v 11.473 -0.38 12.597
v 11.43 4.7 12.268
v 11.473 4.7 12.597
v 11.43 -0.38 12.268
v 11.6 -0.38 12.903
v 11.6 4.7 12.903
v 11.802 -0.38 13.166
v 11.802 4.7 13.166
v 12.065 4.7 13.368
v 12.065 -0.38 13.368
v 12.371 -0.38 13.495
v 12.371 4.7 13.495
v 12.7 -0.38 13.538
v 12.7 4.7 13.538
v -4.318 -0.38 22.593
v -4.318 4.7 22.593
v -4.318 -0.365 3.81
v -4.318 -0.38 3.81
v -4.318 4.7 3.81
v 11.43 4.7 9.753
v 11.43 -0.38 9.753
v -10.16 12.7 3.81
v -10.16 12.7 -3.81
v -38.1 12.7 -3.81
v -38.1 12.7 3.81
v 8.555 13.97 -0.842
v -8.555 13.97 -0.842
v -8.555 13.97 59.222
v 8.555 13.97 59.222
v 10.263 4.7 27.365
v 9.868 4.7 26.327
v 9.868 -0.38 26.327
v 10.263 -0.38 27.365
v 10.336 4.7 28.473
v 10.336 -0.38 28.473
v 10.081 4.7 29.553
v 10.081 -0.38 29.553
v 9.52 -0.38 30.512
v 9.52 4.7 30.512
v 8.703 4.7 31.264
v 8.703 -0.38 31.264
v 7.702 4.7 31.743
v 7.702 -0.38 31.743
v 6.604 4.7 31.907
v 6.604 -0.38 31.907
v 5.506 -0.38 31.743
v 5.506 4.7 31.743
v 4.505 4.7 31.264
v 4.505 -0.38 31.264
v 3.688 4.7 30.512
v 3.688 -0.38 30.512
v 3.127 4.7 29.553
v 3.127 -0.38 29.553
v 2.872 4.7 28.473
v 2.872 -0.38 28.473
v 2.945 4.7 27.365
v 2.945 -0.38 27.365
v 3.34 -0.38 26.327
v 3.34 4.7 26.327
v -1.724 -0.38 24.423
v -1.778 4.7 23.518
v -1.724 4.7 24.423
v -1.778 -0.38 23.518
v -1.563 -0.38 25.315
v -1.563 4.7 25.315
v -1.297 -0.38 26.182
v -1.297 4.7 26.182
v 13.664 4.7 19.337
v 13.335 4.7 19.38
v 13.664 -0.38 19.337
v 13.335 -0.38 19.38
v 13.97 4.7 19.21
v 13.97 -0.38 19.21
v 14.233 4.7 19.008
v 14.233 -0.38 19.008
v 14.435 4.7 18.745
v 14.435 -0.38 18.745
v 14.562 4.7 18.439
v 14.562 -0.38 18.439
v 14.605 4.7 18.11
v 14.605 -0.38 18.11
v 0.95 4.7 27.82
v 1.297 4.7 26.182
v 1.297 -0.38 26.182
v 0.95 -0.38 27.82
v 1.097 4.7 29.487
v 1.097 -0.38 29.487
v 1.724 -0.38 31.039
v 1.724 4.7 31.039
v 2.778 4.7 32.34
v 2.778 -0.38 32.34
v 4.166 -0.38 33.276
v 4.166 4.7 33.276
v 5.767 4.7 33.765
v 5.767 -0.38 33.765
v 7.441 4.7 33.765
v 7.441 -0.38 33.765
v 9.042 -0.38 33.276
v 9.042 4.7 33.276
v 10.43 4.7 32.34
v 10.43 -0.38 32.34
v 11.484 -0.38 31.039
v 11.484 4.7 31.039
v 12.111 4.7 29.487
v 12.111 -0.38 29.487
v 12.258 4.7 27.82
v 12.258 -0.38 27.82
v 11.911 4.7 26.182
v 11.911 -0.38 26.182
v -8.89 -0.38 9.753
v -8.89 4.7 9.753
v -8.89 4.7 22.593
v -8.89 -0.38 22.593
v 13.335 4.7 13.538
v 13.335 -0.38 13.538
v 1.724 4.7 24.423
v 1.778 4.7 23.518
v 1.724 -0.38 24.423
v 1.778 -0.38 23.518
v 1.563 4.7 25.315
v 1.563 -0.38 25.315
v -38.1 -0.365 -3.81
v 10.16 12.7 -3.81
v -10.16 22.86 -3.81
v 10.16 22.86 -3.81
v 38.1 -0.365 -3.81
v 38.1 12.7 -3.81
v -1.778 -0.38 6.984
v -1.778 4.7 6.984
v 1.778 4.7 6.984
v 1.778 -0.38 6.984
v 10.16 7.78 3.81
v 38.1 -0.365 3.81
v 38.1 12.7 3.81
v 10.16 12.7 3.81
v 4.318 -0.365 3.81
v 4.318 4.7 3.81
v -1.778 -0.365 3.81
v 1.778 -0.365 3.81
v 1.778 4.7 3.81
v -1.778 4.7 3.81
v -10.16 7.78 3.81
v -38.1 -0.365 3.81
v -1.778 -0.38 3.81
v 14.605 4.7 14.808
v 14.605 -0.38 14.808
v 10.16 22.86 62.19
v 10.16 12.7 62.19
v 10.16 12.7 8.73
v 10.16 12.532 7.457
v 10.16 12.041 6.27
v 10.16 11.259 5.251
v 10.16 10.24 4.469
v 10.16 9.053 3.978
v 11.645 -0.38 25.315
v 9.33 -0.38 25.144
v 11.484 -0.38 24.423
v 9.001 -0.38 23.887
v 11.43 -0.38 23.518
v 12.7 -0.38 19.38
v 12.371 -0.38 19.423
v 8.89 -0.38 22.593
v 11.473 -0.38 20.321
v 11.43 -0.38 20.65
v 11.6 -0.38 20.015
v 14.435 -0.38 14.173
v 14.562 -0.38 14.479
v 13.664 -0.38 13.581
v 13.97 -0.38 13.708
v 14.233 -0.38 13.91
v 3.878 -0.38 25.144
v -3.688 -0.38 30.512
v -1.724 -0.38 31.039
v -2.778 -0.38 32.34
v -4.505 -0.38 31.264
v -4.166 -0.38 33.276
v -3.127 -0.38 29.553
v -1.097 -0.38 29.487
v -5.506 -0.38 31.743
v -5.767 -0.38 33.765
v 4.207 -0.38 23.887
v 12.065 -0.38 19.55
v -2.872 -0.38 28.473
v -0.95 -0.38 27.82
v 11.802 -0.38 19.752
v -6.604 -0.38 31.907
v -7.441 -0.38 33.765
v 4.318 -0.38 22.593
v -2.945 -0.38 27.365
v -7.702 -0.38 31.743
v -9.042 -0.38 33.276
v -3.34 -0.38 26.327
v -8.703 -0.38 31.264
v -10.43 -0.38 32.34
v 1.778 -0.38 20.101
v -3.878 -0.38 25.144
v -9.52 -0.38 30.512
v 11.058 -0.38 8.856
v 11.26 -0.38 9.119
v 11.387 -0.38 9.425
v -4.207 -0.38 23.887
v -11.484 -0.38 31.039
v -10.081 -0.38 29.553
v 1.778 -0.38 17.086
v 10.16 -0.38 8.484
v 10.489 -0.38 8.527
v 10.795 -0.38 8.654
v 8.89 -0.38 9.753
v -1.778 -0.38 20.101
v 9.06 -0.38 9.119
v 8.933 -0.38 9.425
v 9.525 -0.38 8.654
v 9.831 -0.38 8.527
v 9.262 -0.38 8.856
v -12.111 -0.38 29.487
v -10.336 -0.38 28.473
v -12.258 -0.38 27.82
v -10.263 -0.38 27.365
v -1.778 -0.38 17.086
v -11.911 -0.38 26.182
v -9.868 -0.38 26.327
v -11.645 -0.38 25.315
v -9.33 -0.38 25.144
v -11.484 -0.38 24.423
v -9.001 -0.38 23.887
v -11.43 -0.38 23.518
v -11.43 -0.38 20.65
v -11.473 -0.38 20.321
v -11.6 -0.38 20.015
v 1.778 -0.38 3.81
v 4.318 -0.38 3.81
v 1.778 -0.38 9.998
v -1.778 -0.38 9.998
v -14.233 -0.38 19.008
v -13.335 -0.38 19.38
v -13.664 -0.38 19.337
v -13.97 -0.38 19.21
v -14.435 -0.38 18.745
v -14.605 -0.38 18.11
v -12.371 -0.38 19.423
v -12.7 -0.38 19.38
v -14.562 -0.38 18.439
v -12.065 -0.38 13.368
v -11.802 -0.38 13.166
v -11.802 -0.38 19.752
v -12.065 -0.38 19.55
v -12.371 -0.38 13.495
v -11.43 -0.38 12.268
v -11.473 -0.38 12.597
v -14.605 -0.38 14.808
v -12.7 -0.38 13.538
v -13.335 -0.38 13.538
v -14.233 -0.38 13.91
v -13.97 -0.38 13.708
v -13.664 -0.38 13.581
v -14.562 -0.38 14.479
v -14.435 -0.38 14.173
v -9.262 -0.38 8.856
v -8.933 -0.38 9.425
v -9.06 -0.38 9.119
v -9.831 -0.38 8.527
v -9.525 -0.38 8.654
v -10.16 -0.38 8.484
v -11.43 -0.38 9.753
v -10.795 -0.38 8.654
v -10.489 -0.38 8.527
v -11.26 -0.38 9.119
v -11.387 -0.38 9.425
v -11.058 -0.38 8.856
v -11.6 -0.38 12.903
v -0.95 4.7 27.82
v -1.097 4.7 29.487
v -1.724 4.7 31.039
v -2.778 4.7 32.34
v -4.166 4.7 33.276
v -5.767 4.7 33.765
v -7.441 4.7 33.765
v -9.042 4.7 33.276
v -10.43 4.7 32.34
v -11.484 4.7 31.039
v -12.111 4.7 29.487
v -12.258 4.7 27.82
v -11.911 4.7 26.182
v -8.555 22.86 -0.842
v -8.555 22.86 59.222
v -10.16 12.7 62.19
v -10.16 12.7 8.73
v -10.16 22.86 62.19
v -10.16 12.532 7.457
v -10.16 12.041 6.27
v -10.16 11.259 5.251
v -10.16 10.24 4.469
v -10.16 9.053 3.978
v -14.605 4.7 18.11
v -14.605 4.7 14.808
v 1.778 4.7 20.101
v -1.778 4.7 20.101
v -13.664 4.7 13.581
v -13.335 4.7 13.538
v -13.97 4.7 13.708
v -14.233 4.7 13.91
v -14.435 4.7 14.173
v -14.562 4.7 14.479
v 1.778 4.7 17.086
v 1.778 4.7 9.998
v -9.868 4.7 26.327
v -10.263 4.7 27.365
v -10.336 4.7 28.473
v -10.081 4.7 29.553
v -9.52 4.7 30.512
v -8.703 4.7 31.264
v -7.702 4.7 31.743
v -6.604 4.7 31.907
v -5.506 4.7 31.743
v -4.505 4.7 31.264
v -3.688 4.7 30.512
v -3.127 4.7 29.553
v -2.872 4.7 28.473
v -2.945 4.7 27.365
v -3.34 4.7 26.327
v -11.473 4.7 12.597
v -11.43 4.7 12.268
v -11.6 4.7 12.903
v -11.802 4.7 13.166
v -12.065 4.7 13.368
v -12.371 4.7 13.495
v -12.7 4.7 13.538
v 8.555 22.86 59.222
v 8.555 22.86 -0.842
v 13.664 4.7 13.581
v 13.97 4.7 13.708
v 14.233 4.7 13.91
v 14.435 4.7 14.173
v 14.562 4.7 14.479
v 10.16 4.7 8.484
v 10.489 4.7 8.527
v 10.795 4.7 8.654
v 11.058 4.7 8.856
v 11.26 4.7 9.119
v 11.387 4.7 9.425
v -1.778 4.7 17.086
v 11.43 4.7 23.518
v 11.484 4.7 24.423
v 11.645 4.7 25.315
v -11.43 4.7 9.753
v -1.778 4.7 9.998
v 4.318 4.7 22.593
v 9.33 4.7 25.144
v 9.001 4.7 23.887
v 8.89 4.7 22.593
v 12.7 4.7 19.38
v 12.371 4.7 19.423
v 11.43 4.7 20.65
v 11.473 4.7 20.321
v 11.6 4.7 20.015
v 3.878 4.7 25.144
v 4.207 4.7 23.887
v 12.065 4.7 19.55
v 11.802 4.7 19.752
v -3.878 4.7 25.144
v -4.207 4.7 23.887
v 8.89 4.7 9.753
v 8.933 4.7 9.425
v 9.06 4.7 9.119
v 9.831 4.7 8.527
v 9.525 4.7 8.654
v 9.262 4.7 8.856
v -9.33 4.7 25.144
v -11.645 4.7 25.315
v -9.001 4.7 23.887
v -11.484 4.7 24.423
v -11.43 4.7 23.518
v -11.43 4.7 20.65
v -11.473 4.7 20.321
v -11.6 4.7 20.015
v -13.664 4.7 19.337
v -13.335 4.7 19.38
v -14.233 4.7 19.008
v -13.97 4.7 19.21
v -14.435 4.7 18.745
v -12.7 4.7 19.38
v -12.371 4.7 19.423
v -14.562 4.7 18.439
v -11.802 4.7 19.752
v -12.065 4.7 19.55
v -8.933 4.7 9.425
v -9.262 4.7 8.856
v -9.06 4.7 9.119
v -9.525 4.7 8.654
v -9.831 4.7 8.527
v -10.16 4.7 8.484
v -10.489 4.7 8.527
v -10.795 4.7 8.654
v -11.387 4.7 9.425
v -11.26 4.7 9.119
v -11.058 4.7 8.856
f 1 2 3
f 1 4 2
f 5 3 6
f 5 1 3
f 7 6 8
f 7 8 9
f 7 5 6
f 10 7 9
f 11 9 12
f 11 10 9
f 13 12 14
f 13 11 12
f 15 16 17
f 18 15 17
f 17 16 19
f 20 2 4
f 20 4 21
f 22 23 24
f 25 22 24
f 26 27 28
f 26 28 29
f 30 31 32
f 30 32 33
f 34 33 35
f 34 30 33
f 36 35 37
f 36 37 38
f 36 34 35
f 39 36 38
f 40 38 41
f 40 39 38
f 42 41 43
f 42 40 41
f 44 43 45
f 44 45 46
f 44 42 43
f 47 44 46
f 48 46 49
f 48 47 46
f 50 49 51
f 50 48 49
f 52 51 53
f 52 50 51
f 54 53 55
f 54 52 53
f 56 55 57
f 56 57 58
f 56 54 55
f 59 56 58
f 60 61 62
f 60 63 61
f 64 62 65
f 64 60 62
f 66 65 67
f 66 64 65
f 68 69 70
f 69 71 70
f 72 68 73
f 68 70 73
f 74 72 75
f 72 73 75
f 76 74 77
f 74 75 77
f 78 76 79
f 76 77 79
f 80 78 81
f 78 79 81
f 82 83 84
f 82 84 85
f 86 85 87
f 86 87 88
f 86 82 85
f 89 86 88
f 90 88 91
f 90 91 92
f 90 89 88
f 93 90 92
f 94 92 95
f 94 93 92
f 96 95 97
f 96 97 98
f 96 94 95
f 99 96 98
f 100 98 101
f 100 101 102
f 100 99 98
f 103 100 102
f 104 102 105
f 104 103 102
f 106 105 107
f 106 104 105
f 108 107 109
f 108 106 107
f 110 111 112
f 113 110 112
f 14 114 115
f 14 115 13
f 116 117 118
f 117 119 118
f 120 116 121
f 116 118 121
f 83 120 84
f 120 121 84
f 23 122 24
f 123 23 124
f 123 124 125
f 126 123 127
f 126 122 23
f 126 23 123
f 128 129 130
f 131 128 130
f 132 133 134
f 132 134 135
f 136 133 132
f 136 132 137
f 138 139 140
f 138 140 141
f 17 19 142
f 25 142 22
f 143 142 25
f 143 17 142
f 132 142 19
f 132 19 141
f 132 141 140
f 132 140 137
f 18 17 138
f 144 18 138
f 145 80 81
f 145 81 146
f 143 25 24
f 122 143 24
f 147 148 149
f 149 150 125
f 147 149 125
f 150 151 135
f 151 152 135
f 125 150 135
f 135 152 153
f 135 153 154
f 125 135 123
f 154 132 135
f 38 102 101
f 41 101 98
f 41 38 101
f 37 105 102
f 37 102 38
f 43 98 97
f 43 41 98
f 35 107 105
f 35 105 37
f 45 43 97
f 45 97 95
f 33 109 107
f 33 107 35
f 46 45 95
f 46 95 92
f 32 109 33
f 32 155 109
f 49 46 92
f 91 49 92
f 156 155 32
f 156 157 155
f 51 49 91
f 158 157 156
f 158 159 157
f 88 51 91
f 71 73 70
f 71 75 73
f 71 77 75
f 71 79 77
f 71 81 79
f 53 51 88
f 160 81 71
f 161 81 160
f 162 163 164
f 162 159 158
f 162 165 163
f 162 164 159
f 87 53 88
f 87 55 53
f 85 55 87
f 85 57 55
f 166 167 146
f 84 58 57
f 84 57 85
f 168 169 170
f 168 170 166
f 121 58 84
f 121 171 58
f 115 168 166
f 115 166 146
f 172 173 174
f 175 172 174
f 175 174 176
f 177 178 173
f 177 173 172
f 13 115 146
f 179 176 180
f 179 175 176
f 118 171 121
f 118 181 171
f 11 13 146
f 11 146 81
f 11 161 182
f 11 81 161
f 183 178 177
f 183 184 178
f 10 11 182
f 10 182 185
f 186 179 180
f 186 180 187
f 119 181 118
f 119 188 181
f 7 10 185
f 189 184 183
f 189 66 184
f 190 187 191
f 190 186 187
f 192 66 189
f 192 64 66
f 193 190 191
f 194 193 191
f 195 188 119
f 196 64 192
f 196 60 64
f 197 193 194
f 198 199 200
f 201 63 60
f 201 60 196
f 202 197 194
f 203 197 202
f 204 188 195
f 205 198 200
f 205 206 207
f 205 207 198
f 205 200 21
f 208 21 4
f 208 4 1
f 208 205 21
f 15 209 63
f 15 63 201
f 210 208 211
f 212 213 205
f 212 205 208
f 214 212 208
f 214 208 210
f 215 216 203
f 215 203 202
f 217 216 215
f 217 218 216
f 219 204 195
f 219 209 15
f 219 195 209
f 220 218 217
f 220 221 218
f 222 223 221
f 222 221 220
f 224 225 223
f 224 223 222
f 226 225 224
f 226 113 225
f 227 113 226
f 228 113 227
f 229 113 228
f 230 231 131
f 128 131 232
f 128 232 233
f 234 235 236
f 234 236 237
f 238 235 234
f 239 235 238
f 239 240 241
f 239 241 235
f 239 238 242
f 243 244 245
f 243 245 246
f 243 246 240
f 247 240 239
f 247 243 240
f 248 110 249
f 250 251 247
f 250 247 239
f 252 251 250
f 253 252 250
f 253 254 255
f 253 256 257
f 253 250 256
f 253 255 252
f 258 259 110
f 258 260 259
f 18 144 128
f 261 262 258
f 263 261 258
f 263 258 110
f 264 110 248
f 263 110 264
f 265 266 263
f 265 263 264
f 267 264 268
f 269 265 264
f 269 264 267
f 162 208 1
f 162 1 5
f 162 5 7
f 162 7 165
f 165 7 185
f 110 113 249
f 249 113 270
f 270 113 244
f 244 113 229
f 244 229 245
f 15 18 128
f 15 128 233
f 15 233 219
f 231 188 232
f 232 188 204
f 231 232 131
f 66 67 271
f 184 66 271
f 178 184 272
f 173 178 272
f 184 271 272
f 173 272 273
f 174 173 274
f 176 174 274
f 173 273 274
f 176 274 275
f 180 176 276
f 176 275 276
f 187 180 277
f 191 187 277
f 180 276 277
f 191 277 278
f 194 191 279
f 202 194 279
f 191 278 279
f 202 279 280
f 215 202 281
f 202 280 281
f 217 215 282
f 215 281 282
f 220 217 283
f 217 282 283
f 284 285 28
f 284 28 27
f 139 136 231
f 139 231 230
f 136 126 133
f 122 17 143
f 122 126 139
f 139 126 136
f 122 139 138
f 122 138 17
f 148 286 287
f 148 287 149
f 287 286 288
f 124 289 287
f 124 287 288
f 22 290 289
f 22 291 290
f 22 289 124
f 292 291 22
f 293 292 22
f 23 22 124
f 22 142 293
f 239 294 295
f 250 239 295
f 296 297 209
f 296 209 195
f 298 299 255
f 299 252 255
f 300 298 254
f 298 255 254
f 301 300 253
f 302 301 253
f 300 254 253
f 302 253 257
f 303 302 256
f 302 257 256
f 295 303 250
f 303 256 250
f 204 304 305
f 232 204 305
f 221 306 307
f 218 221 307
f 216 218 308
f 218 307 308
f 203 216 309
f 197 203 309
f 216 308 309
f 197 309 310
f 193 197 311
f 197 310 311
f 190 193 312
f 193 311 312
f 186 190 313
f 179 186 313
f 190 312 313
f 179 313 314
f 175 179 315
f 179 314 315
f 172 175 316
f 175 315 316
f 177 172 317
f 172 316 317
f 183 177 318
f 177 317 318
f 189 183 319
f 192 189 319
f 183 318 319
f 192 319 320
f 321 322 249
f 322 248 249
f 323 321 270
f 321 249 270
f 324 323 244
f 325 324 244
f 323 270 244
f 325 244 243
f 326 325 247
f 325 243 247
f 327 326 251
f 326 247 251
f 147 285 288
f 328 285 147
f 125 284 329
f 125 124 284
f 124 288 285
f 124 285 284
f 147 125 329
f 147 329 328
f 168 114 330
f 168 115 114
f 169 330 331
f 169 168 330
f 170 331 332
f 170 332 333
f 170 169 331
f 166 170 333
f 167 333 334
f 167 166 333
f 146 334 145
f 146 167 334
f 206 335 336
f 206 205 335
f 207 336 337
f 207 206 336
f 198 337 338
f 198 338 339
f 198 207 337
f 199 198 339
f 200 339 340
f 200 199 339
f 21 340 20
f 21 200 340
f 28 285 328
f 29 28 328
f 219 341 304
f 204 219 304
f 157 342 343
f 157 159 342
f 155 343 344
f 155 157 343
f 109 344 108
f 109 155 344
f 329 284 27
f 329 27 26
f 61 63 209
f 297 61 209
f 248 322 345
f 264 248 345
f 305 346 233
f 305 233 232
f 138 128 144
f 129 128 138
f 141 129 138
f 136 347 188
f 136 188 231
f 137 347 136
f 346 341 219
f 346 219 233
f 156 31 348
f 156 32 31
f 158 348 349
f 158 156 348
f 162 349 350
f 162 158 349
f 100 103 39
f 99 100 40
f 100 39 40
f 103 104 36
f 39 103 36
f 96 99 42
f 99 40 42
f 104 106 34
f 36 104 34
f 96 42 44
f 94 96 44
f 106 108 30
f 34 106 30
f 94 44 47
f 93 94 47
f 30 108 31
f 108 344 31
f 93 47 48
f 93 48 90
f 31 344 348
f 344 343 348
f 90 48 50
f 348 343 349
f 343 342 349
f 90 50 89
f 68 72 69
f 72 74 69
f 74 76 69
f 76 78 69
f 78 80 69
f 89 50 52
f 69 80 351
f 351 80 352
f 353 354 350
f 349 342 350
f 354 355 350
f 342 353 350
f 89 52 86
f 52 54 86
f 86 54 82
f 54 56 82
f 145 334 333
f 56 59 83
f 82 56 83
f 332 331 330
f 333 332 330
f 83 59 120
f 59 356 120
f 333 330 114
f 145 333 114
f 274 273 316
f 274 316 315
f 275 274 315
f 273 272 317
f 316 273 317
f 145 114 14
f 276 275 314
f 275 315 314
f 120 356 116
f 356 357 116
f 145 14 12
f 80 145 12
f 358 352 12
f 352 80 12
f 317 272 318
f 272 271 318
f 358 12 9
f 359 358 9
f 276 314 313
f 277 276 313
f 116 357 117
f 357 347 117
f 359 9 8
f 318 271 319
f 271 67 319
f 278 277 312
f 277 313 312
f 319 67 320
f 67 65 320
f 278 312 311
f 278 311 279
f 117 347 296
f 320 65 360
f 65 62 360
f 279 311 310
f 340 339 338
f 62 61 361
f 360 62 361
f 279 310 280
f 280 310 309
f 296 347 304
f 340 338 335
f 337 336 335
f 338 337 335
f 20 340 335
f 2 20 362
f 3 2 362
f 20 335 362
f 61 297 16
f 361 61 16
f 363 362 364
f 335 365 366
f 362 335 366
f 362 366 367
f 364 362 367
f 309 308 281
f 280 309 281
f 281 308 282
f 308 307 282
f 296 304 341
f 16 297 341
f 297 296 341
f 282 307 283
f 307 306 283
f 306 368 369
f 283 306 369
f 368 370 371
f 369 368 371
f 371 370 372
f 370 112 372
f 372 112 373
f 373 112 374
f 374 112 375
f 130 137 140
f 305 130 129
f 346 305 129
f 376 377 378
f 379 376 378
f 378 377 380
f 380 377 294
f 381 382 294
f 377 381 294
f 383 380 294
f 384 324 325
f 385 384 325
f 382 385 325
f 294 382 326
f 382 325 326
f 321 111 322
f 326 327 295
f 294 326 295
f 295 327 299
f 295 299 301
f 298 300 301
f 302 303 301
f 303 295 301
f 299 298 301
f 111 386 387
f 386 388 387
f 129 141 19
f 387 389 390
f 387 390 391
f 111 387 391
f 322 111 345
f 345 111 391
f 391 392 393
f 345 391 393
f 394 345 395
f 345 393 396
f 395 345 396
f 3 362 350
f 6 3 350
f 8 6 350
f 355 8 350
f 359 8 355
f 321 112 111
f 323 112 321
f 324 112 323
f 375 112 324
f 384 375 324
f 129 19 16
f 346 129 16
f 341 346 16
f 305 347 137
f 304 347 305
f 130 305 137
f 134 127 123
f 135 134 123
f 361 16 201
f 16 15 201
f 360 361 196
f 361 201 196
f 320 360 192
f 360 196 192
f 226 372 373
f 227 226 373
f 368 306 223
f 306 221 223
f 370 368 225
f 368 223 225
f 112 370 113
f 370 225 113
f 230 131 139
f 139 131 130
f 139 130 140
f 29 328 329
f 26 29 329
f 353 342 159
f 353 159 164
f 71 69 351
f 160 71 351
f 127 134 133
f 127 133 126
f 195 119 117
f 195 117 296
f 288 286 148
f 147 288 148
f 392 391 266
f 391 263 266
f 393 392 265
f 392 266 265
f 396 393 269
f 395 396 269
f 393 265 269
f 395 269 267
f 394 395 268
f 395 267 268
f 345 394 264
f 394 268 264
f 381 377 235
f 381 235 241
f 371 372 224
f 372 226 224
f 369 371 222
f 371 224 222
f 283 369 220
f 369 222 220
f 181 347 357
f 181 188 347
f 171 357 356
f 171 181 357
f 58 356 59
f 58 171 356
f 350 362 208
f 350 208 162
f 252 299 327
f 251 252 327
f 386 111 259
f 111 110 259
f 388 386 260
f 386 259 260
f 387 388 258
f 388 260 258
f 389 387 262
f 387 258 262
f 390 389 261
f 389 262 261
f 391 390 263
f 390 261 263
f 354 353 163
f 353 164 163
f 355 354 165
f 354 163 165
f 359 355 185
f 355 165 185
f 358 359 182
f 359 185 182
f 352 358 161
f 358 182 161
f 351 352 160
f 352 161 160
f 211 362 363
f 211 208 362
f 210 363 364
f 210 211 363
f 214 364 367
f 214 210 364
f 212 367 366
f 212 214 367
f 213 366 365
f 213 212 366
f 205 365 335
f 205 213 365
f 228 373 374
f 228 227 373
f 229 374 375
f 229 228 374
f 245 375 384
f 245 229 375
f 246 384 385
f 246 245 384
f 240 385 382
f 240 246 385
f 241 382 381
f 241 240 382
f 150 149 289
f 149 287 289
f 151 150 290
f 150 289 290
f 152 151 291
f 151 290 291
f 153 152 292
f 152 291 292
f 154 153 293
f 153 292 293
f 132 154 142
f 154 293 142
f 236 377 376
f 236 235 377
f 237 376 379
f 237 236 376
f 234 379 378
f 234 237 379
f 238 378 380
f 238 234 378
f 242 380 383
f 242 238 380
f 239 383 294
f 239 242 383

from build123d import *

# Parameters (mm, degrees)
BOSS_EXTRUDE1_DEPTH      = 12.7
BOSS_EXTRUDE1_DEPTH_BACK = 0.364929482
SKETCH1_W                = 76.2
SKETCH1_H                = 7.62
SKETCH14_W               = 38.1
SKETCH14_H               = 7.62
CUT_EXTRUDE5_DEPTH       = 19.558
BOSS_EXTRUDE2_START      = -8
SKETCH15_W               = 2.54
SKETCH15_H               = 21.3868
SKETCH15_W_2             = 3.175
SKETCH15_H_2             = 5.842
BOSS_EXTRUDE2_DEPTH      = 5.08
FILLET1_R                = 7.62
FILLET2_R                = 1.27
SKETCH17_W               = 3.556
SKETCH17_H               = 3.014496912
BOSS_EXTRUDE3_DEPTH      = 5.08
SKETCH18_W               = 20.32
SKETCH18_H               = 66
BOSS_EXTRUDE4_DEPTH      = 10.16
SKETCH19_W               = 17.109306796
SKETCH19_H               = 60.063536248
CUT_EXTRUDE14_DEPTH      = 8.89
FILLET3_R                = 4.92


with BuildPart() as part:
    # Sketch1 → Boss-Extrude1 (new, two sides: drawn at the far end of the back side and taken through both)
    with BuildSketch(Plane(origin=(0, 0, 0), x_dir=(1, 0, 0), z_dir=(0, 1, 0)).offset(-BOSS_EXTRUDE1_DEPTH_BACK)):
        Rectangle(SKETCH1_W, SKETCH1_H)
    extrude(amount=BOSS_EXTRUDE1_DEPTH + BOSS_EXTRUDE1_DEPTH_BACK)

    # Sketch14 → Cut-Extrude5 (cut)
    with BuildSketch(Plane(origin=(0, 12.7, 0), x_dir=(1, 0, 0), z_dir=(0, 1, 0))):
        with Locations((19.05, 0)):
            Rectangle(SKETCH14_W, SKETCH14_H)
    extrude(amount=-CUT_EXTRUDE5_DEPTH, mode=Mode.SUBTRACT)

    # Sketch15 → Boss-Extrude2 (add)
    with BuildSketch(Plane(origin=(0, 12.7, 0), x_dir=(1, 0, 0), z_dir=(0, 1, 0)).offset(BOSS_EXTRUDE2_START)):
        with Locations((-3.048, -14.5034)):
            Rectangle(SKETCH15_W, SKETCH15_H)
        with BuildLine():
            ThreePointArc((-8.89, -25.1968), (-6.604, -31.907368859), (-4.318, -25.1968))
            Line((-4.318, -25.1968), (-1.778, -25.1968))
            ThreePointArc((-1.778, -25.1968), (-6.604, -33.827245709), (-11.43, -25.1968))
            Line((-11.43, -25.1968), (-11.43, -8.4836))
            Line((-11.43, -8.4836), (-8.89, -8.4836))
            Line((-8.89, -8.4836), (-8.89, -25.1968))
        make_face()
        with Locations((-13.0175, -16.4592)):
            Rectangle(SKETCH15_W_2, SKETCH15_H_2)
    extrude(amount=-BOSS_EXTRUDE2_DEPTH)

    # Fillet1
    fillet1_edges = [part.edges().sort_by_distance(p)[0] for p in [
        (-11.43, 2.16, 25.1968),
        (-1.778, 2.16, 25.1968),
        (-8.89, 2.16, 25.1968),
        (-4.318, 2.16, 25.1968),
    ]]
    fillet(fillet1_edges, radius=FILLET1_R)

    # Fillet2
    fillet2_edges = [part.edges().sort_by_distance(p)[0] for p in [
        (-11.43, 2.16, 19.3802),
        (-14.605, 2.16, 19.3802),
        (-14.605, 2.16, 13.5382),
        (-11.43, 2.16, 13.5382),
        (-8.89, 2.16, 8.4836),
        (-11.43, 2.16, 8.4836),
    ]]
    fillet(fillet2_edges, radius=FILLET2_R - 0.0001)  # a hair under: the kernel refuses the full size

    # Mirror1: part across plane


with BuildPart() as part_1:
    add(part.part)
    add(part.part.mirror(Plane(origin=(0, -6.858, -3.81), x_dir=(0, 0, 1), z_dir=(-1, 0, 0))))

    # Sketch17 → Boss-Extrude3 (add)
    with BuildSketch(Plane(origin=(0, 4.7, 0), x_dir=(1, 0, 0), z_dir=(0, 1, 0))):
        with Locations((0, -8.490791694)):
            Rectangle(SKETCH17_W, SKETCH17_H)
        with Locations((0, -18.593429993)):
            Rectangle(SKETCH17_W, SKETCH17_H)
    extrude(amount=-BOSS_EXTRUDE3_DEPTH)

    # Sketch18 → Boss-Extrude4 (add)
    with BuildSketch(Plane(origin=(0, 12.7, 0), x_dir=(1, 0, 0), z_dir=(0, 1, 0))):
        with Locations((0, -29.19)):
            Rectangle(SKETCH18_W, SKETCH18_H)
    extrude(amount=BOSS_EXTRUDE4_DEPTH)

    # Sketch19 → Cut-Extrude14 (cut)
    with BuildSketch(Plane(origin=(0, 22.86, 0), x_dir=(1, 0, 0), z_dir=(0, 1, 0))):
        with Locations((0, -29.19)):
            Rectangle(SKETCH19_W, SKETCH19_H)
    extrude(amount=-CUT_EXTRUDE14_DEPTH, mode=Mode.SUBTRACT)

    # Fillet3
    fillet3_edges = [part_1.edges().sort_by_distance(p)[0] for p in [
        (0, 12.7, 3.81),
    ]]
    fillet(fillet3_edges, radius=FILLET3_R)


solid = part_1.part
